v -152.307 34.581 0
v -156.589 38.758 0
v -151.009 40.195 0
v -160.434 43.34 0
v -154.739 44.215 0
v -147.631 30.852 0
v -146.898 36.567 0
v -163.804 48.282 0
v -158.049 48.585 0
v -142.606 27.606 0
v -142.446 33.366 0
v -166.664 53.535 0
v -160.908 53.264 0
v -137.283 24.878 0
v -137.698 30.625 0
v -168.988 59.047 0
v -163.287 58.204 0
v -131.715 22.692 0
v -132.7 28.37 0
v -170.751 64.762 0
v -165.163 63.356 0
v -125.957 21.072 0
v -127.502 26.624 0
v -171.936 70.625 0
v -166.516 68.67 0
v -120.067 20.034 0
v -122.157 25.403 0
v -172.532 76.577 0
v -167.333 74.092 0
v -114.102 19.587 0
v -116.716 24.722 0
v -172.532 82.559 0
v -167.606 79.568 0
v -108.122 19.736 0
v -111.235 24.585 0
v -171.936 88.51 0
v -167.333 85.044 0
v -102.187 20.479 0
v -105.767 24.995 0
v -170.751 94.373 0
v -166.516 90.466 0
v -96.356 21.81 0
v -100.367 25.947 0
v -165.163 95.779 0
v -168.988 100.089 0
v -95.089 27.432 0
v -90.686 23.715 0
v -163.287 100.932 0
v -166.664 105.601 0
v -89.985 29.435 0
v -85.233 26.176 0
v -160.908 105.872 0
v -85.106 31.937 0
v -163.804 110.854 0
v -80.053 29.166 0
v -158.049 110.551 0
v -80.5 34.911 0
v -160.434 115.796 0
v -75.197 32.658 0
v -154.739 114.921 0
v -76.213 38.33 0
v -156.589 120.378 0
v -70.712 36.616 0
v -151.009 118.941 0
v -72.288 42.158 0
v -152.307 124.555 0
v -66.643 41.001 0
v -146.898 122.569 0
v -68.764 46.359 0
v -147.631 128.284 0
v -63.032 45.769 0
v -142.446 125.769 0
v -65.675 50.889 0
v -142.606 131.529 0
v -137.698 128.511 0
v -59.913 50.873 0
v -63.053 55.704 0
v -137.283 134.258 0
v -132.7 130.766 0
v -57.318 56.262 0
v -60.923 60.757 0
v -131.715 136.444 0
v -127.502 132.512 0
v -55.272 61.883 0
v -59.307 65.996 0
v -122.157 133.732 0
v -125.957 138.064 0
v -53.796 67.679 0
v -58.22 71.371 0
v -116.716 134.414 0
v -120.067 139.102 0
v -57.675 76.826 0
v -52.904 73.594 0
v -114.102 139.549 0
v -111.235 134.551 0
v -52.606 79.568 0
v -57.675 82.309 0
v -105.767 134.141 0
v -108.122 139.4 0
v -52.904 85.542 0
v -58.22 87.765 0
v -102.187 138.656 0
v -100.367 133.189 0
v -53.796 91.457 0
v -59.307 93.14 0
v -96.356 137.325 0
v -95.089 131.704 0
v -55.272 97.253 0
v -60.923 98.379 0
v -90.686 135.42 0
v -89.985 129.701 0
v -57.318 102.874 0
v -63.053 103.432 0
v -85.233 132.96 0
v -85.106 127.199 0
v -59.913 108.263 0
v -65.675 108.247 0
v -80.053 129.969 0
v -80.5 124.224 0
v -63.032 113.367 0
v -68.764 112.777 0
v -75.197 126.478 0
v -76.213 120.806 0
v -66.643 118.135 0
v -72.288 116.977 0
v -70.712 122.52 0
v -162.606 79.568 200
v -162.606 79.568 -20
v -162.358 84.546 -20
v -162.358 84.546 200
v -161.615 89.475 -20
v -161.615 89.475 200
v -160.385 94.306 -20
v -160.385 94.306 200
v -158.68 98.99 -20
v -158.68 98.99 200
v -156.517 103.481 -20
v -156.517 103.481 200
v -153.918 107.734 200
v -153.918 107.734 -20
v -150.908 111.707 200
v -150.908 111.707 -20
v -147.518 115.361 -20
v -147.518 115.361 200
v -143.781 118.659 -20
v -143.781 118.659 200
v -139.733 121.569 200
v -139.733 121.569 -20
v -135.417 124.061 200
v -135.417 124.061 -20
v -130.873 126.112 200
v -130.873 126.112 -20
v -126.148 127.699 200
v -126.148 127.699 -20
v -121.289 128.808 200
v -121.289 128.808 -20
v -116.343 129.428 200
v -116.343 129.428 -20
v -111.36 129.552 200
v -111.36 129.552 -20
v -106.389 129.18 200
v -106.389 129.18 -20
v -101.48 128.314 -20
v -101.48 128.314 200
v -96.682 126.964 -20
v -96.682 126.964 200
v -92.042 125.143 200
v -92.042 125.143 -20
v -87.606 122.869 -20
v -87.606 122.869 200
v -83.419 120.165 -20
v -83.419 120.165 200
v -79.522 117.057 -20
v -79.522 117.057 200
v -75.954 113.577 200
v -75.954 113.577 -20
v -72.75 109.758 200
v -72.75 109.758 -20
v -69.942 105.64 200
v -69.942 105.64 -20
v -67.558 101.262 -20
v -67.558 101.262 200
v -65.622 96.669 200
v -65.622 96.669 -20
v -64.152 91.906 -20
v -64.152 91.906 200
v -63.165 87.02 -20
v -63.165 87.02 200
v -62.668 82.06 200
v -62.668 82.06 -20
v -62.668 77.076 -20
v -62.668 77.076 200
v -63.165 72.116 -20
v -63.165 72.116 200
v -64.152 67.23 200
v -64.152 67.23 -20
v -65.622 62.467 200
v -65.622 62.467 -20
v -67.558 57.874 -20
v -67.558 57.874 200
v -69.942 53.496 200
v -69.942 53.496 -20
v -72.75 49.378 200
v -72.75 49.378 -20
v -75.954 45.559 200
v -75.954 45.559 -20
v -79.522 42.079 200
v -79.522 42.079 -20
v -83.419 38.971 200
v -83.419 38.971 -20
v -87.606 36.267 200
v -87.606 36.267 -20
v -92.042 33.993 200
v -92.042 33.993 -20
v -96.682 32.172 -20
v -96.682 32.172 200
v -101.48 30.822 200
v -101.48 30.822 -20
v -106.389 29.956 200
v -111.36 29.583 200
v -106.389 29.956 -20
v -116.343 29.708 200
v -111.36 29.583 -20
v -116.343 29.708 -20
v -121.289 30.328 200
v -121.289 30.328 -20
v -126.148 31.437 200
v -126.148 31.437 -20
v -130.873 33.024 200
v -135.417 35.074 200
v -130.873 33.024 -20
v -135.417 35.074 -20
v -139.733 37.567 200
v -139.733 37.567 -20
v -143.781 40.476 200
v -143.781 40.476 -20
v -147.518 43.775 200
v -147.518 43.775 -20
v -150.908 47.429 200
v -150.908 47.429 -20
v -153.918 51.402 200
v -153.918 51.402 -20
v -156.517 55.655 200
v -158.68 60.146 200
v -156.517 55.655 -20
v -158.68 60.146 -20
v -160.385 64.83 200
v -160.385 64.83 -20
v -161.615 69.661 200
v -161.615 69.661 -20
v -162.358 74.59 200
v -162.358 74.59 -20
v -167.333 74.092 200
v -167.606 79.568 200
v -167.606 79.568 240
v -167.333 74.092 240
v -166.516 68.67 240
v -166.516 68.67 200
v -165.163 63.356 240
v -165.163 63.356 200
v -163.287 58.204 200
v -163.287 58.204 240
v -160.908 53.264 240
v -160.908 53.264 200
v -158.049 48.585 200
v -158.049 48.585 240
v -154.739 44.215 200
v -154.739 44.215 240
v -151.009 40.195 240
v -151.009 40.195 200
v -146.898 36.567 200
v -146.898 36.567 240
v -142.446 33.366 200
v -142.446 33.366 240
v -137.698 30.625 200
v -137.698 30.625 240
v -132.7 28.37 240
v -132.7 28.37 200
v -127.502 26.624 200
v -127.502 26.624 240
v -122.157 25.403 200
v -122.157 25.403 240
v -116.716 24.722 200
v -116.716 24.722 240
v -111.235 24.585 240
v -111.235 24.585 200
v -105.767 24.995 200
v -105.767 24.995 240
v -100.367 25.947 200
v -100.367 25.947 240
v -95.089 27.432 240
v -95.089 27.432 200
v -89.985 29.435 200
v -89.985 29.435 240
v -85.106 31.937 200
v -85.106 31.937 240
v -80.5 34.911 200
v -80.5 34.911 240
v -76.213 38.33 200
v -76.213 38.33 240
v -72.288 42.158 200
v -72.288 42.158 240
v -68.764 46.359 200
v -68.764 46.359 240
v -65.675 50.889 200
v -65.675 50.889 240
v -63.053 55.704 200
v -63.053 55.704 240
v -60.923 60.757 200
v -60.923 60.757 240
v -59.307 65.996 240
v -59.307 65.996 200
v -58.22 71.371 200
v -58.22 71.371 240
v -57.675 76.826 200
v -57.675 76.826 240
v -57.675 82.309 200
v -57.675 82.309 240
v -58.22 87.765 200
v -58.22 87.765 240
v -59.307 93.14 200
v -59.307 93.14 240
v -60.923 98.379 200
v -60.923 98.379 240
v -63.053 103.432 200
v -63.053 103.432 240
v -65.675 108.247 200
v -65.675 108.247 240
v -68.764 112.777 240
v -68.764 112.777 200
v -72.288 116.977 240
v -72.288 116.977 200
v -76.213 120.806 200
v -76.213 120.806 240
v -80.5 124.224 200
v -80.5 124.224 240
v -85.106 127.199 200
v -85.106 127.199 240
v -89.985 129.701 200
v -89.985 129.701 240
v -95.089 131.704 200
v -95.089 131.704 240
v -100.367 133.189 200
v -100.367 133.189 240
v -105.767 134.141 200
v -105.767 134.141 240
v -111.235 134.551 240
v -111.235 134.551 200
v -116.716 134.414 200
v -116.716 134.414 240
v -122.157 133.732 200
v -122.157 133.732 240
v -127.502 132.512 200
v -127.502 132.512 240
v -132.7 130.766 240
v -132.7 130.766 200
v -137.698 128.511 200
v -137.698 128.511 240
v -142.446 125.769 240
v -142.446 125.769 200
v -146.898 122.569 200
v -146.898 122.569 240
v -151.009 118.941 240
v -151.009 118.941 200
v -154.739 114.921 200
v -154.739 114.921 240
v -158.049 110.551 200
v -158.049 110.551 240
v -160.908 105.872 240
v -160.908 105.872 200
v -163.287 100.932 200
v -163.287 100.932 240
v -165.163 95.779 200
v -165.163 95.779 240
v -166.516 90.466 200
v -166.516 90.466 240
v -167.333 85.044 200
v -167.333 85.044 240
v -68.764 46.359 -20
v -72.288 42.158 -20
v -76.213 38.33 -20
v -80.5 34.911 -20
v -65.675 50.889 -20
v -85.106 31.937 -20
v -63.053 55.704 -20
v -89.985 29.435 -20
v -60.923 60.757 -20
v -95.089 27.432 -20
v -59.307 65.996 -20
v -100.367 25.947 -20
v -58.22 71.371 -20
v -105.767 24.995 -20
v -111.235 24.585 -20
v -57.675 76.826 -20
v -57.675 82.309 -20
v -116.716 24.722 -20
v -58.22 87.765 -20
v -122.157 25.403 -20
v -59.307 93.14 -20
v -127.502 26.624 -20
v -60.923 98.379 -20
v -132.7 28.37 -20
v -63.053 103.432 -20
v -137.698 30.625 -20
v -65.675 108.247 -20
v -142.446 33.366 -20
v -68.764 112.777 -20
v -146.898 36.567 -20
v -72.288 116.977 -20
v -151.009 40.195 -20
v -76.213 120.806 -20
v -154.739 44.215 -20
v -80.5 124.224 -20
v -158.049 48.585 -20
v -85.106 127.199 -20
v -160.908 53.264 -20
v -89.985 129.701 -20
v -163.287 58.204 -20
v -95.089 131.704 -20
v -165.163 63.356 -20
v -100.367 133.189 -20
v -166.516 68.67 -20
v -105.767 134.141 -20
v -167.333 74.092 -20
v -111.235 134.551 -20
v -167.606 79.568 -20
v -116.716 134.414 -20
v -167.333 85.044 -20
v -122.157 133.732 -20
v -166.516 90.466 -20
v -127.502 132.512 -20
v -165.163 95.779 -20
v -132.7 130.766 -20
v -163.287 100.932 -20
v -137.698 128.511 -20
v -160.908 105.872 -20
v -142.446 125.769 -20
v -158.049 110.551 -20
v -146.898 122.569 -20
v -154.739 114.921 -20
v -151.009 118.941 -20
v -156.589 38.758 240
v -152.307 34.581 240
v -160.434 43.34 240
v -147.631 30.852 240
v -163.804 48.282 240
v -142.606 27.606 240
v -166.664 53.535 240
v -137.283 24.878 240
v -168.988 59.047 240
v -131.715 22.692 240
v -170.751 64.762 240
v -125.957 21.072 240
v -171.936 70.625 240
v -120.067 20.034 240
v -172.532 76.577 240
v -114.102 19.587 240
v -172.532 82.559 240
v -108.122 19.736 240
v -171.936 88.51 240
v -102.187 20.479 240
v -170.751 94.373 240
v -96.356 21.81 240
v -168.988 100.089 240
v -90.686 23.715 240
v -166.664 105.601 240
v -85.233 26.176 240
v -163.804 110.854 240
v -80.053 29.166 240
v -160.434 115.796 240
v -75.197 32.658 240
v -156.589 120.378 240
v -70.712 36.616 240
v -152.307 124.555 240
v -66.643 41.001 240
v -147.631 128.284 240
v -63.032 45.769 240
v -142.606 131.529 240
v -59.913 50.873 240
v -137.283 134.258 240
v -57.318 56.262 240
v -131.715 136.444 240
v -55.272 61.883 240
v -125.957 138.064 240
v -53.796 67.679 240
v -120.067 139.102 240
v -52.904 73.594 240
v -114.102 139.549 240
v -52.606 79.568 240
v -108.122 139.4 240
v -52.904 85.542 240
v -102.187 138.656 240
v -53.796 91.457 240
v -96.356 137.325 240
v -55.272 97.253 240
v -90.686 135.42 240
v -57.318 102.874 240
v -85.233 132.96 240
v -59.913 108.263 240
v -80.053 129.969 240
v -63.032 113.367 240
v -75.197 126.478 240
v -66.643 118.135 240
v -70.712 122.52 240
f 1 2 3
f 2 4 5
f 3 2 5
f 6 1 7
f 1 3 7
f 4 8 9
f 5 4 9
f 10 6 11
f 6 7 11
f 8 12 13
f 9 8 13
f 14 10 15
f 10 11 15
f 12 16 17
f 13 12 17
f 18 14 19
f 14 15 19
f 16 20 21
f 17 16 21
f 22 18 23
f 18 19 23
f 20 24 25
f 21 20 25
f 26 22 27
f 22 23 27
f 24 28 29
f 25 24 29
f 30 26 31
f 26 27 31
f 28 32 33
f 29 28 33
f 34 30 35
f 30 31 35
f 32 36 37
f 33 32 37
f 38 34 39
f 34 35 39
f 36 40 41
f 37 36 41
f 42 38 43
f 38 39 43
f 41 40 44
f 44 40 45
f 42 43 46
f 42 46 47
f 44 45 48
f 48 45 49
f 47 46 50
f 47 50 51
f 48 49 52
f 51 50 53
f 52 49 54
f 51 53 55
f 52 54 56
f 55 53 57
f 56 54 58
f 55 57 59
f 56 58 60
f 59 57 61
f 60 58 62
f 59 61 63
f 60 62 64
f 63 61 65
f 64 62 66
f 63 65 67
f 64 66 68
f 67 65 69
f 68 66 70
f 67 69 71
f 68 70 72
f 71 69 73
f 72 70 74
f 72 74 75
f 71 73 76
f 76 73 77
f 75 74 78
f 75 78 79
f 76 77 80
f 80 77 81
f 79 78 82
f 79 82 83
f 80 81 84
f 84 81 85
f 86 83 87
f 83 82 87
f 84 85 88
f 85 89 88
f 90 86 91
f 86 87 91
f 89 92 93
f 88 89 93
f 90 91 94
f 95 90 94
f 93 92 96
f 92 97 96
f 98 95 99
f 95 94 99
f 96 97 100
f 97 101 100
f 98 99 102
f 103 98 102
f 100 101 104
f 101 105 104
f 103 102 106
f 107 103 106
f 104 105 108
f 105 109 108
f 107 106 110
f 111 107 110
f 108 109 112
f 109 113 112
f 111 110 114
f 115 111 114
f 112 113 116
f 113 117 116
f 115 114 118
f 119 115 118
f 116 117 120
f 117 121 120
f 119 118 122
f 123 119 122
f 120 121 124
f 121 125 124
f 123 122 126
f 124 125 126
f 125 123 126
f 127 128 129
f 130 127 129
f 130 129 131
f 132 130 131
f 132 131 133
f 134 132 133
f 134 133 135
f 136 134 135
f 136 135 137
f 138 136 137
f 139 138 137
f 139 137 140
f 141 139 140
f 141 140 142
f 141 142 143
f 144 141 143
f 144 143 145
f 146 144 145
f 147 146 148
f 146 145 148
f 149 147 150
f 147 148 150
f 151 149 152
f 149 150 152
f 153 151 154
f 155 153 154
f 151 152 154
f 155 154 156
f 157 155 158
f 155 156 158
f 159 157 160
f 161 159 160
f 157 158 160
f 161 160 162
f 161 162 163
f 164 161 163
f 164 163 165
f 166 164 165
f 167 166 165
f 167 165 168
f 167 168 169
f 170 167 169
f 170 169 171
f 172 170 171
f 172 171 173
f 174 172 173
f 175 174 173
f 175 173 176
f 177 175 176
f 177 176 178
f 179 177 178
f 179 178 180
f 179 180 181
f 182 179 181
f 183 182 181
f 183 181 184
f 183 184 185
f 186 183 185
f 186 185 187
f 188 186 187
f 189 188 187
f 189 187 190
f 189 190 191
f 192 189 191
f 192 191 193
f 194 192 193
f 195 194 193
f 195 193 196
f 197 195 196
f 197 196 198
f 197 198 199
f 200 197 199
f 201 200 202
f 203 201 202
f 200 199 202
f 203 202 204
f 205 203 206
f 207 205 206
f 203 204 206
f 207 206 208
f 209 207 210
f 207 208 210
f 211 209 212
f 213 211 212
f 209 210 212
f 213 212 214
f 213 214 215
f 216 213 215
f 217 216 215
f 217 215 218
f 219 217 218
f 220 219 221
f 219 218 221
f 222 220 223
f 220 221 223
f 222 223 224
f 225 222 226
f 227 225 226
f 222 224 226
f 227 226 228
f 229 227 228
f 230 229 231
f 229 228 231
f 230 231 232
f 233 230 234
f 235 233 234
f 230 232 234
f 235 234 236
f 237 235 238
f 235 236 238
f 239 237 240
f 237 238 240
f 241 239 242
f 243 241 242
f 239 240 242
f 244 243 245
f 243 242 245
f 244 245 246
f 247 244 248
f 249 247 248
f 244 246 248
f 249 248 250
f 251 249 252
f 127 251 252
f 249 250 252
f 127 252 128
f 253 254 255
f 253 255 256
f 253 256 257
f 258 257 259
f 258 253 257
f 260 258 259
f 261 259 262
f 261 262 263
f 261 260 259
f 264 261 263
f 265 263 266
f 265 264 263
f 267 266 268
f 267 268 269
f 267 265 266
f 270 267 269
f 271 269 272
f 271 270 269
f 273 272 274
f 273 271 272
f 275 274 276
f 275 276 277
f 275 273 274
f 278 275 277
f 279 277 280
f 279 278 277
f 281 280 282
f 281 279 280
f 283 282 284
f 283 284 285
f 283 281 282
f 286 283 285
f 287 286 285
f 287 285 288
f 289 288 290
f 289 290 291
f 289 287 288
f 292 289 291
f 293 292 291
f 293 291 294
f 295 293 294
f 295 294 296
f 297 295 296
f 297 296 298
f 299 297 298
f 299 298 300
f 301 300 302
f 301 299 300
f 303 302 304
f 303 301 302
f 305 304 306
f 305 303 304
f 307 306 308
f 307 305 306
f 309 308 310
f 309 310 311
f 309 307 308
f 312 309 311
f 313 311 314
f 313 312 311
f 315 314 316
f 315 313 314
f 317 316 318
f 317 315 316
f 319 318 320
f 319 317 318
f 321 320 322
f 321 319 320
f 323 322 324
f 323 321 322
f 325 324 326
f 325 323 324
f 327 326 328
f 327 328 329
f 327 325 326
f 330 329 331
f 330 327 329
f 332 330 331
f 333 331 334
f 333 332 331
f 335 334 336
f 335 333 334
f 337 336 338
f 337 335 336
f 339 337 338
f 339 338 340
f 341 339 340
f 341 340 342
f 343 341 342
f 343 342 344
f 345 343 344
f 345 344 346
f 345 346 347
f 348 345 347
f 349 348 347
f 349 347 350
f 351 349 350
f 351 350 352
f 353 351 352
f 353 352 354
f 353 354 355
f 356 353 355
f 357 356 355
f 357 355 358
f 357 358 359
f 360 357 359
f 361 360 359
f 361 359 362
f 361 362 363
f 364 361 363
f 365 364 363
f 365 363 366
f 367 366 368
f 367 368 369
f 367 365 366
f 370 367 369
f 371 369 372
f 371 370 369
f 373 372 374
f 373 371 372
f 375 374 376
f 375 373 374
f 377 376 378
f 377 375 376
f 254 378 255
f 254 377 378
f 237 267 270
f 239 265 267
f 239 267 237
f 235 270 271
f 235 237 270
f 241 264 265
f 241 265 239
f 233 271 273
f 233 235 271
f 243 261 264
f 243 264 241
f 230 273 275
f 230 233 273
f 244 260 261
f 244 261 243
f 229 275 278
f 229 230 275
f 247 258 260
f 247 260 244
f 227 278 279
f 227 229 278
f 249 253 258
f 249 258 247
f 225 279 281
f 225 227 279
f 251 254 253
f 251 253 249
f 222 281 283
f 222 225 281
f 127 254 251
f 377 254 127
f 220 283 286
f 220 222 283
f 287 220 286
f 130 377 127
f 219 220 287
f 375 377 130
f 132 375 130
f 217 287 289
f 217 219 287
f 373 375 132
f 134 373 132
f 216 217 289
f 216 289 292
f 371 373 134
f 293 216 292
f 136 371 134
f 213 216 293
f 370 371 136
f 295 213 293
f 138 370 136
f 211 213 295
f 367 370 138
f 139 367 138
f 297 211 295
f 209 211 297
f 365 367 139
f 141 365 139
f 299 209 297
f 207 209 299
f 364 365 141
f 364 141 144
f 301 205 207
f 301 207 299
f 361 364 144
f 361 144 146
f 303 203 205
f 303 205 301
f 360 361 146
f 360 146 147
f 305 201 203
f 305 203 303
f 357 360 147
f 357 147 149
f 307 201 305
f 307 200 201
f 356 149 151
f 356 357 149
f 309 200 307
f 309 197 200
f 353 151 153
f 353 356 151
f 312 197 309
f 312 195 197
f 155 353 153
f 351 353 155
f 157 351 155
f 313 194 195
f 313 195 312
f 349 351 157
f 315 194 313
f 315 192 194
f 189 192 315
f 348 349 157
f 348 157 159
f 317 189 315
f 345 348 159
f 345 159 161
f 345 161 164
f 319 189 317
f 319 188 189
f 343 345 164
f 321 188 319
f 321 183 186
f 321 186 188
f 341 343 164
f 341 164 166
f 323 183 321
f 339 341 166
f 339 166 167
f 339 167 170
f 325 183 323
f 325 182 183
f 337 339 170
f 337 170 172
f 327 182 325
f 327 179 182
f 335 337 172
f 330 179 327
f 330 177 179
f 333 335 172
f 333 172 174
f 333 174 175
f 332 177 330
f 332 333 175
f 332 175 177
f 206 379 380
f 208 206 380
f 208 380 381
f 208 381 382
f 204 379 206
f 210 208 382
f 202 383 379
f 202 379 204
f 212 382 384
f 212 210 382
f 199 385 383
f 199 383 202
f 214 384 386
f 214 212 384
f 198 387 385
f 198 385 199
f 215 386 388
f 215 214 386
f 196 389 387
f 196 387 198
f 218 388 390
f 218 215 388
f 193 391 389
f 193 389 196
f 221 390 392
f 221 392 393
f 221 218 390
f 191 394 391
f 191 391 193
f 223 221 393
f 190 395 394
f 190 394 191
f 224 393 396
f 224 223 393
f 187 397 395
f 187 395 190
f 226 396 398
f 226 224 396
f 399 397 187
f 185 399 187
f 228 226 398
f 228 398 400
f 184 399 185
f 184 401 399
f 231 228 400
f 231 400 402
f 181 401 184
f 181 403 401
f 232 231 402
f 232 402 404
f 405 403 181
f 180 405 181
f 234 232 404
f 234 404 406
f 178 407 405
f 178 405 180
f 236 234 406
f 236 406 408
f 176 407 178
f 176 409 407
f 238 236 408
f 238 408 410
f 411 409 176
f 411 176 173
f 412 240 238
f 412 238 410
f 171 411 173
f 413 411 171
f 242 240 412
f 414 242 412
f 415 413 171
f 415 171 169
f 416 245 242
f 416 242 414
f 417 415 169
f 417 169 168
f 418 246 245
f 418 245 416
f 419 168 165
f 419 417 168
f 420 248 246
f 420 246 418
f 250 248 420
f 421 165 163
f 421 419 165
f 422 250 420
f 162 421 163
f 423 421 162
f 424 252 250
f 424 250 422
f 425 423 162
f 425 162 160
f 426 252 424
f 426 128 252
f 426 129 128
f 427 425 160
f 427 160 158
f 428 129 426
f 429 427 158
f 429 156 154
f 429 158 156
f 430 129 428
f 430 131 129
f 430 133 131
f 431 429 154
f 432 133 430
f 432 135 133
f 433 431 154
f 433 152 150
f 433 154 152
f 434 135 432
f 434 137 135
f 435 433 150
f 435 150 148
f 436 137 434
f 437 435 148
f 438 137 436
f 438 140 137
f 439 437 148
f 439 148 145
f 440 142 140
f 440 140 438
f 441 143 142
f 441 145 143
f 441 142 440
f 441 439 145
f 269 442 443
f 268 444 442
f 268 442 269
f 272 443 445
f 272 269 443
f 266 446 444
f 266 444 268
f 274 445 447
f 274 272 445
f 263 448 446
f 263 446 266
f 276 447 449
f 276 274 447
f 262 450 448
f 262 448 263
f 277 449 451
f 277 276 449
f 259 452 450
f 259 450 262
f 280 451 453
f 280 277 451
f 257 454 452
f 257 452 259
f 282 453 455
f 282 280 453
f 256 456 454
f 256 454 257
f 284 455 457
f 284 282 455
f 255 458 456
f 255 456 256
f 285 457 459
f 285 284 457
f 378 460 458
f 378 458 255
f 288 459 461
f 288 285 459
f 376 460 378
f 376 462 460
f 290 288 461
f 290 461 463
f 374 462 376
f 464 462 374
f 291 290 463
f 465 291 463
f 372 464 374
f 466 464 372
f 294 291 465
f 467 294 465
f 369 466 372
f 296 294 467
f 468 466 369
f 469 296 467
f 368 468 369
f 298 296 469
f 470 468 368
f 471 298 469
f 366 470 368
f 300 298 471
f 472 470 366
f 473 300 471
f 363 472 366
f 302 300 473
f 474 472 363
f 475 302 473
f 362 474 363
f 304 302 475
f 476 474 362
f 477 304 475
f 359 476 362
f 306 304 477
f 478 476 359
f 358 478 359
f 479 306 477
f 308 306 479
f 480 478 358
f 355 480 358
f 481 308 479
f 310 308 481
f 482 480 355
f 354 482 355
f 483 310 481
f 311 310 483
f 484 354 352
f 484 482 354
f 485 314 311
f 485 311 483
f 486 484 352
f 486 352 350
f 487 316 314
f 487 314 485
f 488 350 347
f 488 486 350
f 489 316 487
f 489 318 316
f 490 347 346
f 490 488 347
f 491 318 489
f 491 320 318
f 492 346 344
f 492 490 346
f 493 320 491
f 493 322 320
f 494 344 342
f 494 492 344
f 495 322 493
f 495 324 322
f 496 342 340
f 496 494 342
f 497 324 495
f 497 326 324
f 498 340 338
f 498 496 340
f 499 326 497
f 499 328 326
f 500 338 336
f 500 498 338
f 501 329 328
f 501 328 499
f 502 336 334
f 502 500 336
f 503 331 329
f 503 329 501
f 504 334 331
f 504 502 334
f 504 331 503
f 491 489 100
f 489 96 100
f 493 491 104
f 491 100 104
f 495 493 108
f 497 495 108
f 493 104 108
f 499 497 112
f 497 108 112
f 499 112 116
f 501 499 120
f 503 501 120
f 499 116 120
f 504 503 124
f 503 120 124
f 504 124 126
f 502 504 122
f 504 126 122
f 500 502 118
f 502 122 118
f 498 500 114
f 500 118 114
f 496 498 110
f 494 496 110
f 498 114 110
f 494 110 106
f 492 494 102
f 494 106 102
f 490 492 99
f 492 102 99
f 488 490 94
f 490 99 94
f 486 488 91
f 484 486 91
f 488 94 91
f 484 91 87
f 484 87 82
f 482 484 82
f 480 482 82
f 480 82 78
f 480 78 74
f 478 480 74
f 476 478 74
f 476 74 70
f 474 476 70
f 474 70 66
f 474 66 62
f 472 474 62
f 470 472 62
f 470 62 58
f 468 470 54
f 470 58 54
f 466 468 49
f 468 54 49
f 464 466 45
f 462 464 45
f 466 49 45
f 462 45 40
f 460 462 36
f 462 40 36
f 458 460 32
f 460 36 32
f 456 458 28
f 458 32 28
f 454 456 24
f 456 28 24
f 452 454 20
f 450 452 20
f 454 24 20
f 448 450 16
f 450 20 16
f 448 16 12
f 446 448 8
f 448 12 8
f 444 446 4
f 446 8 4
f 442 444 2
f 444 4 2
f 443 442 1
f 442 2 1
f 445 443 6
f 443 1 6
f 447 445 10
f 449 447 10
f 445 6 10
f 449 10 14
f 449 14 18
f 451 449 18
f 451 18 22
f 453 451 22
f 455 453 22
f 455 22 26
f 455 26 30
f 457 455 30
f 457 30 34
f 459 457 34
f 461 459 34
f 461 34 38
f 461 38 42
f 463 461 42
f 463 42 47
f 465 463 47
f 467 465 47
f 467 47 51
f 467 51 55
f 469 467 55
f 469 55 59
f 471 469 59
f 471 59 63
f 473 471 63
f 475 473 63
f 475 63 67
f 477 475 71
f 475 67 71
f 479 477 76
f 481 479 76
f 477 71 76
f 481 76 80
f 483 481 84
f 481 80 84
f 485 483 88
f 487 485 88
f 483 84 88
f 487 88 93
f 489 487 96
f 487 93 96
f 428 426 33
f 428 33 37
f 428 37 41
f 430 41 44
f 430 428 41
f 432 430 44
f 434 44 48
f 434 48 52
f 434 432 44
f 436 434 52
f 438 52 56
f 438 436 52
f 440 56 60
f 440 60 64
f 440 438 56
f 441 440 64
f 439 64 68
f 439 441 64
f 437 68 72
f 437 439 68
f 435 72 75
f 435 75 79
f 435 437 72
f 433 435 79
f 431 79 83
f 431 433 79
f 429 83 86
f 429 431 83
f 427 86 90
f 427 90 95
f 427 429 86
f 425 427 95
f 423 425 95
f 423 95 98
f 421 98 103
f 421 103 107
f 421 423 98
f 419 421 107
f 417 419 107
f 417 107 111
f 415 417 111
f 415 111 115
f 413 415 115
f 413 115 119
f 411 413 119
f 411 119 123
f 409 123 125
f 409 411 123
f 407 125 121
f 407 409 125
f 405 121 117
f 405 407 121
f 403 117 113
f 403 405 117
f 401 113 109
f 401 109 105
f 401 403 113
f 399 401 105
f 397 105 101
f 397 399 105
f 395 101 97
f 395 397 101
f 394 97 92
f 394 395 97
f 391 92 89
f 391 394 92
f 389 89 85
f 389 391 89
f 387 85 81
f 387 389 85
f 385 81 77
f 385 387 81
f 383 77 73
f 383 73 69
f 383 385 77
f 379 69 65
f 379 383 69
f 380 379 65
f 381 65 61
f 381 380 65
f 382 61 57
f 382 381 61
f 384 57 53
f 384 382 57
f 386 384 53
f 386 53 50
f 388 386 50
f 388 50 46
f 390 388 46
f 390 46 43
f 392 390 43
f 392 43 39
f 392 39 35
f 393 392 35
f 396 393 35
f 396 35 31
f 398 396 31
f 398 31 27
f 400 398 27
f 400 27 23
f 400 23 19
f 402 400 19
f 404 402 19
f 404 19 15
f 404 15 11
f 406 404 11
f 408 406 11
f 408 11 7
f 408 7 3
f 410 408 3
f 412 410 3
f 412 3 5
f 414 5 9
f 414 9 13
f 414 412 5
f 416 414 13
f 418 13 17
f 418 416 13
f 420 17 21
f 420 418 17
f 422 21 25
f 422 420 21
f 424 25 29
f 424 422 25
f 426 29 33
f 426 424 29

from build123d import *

# Parameters (mm, degrees)
SKETCH_2_R          = 60
EXTRUDE_1_DEPTH     = 200
SKETCH_3_R          = 50
CUT_EXTRUDE_1_DEPTH = 200
EXTRUDE_START       = 20
SKETCH_4_R          = 55
SKETCH_4_R_2        = 50
EXTRUDE_2_DEPTH     = 20
SKETCH_5_R          = 60
SKETCH_5_R_2        = 55
EXTRUDE_3_DEPTH     = 40


with BuildPart() as part:
    # 草图2 → 凸台-拉伸1 (new body)
    with BuildSketch(Plane.XY):
        with Locations((-112.606133367, 79.56790028)):
            Circle(SKETCH_2_R)
    extrude(amount=EXTRUDE_1_DEPTH)

    # 草图3 → 切除-拉伸1 (cut)
    with BuildSketch(Plane(origin=(0, 0, 0), x_dir=(-1, 0, 0), z_dir=(0, 0, -1))):
        with Locations((112.606133367, 79.56790028)):
            Circle(SKETCH_3_R)
    extrude(amount=-CUT_EXTRUDE_1_DEPTH, mode=Mode.SUBTRACT)

    # 草图4 → 凸台-拉伸2 (add)
    with BuildSketch(Plane(origin=(0, 0, 0), x_dir=(-1, 0, 0), z_dir=(0, 0, -1)).offset(EXTRUDE_START)):
        with Locations((112.606133367, 79.56790028)):
            Circle(SKETCH_4_R)
        with Locations((112.606133367, 79.56790028)):
            Circle(SKETCH_4_R_2, mode=Mode.SUBTRACT)
    extrude(amount=-EXTRUDE_2_DEPTH)

    # 草图5 → 凸台-拉伸3 (add)
    with BuildSketch(Plane.XY.offset(200)):
        with Locations((-112.606133367, 79.56790028)):
            Circle(SKETCH_5_R)
        with Locations(Location((-112.606133367, 79.56790028, 0), (0, 0, 180))):
            Circle(SKETCH_5_R_2, mode=Mode.SUBTRACT)
    extrude(amount=EXTRUDE_3_DEPTH)


solid = part.part
